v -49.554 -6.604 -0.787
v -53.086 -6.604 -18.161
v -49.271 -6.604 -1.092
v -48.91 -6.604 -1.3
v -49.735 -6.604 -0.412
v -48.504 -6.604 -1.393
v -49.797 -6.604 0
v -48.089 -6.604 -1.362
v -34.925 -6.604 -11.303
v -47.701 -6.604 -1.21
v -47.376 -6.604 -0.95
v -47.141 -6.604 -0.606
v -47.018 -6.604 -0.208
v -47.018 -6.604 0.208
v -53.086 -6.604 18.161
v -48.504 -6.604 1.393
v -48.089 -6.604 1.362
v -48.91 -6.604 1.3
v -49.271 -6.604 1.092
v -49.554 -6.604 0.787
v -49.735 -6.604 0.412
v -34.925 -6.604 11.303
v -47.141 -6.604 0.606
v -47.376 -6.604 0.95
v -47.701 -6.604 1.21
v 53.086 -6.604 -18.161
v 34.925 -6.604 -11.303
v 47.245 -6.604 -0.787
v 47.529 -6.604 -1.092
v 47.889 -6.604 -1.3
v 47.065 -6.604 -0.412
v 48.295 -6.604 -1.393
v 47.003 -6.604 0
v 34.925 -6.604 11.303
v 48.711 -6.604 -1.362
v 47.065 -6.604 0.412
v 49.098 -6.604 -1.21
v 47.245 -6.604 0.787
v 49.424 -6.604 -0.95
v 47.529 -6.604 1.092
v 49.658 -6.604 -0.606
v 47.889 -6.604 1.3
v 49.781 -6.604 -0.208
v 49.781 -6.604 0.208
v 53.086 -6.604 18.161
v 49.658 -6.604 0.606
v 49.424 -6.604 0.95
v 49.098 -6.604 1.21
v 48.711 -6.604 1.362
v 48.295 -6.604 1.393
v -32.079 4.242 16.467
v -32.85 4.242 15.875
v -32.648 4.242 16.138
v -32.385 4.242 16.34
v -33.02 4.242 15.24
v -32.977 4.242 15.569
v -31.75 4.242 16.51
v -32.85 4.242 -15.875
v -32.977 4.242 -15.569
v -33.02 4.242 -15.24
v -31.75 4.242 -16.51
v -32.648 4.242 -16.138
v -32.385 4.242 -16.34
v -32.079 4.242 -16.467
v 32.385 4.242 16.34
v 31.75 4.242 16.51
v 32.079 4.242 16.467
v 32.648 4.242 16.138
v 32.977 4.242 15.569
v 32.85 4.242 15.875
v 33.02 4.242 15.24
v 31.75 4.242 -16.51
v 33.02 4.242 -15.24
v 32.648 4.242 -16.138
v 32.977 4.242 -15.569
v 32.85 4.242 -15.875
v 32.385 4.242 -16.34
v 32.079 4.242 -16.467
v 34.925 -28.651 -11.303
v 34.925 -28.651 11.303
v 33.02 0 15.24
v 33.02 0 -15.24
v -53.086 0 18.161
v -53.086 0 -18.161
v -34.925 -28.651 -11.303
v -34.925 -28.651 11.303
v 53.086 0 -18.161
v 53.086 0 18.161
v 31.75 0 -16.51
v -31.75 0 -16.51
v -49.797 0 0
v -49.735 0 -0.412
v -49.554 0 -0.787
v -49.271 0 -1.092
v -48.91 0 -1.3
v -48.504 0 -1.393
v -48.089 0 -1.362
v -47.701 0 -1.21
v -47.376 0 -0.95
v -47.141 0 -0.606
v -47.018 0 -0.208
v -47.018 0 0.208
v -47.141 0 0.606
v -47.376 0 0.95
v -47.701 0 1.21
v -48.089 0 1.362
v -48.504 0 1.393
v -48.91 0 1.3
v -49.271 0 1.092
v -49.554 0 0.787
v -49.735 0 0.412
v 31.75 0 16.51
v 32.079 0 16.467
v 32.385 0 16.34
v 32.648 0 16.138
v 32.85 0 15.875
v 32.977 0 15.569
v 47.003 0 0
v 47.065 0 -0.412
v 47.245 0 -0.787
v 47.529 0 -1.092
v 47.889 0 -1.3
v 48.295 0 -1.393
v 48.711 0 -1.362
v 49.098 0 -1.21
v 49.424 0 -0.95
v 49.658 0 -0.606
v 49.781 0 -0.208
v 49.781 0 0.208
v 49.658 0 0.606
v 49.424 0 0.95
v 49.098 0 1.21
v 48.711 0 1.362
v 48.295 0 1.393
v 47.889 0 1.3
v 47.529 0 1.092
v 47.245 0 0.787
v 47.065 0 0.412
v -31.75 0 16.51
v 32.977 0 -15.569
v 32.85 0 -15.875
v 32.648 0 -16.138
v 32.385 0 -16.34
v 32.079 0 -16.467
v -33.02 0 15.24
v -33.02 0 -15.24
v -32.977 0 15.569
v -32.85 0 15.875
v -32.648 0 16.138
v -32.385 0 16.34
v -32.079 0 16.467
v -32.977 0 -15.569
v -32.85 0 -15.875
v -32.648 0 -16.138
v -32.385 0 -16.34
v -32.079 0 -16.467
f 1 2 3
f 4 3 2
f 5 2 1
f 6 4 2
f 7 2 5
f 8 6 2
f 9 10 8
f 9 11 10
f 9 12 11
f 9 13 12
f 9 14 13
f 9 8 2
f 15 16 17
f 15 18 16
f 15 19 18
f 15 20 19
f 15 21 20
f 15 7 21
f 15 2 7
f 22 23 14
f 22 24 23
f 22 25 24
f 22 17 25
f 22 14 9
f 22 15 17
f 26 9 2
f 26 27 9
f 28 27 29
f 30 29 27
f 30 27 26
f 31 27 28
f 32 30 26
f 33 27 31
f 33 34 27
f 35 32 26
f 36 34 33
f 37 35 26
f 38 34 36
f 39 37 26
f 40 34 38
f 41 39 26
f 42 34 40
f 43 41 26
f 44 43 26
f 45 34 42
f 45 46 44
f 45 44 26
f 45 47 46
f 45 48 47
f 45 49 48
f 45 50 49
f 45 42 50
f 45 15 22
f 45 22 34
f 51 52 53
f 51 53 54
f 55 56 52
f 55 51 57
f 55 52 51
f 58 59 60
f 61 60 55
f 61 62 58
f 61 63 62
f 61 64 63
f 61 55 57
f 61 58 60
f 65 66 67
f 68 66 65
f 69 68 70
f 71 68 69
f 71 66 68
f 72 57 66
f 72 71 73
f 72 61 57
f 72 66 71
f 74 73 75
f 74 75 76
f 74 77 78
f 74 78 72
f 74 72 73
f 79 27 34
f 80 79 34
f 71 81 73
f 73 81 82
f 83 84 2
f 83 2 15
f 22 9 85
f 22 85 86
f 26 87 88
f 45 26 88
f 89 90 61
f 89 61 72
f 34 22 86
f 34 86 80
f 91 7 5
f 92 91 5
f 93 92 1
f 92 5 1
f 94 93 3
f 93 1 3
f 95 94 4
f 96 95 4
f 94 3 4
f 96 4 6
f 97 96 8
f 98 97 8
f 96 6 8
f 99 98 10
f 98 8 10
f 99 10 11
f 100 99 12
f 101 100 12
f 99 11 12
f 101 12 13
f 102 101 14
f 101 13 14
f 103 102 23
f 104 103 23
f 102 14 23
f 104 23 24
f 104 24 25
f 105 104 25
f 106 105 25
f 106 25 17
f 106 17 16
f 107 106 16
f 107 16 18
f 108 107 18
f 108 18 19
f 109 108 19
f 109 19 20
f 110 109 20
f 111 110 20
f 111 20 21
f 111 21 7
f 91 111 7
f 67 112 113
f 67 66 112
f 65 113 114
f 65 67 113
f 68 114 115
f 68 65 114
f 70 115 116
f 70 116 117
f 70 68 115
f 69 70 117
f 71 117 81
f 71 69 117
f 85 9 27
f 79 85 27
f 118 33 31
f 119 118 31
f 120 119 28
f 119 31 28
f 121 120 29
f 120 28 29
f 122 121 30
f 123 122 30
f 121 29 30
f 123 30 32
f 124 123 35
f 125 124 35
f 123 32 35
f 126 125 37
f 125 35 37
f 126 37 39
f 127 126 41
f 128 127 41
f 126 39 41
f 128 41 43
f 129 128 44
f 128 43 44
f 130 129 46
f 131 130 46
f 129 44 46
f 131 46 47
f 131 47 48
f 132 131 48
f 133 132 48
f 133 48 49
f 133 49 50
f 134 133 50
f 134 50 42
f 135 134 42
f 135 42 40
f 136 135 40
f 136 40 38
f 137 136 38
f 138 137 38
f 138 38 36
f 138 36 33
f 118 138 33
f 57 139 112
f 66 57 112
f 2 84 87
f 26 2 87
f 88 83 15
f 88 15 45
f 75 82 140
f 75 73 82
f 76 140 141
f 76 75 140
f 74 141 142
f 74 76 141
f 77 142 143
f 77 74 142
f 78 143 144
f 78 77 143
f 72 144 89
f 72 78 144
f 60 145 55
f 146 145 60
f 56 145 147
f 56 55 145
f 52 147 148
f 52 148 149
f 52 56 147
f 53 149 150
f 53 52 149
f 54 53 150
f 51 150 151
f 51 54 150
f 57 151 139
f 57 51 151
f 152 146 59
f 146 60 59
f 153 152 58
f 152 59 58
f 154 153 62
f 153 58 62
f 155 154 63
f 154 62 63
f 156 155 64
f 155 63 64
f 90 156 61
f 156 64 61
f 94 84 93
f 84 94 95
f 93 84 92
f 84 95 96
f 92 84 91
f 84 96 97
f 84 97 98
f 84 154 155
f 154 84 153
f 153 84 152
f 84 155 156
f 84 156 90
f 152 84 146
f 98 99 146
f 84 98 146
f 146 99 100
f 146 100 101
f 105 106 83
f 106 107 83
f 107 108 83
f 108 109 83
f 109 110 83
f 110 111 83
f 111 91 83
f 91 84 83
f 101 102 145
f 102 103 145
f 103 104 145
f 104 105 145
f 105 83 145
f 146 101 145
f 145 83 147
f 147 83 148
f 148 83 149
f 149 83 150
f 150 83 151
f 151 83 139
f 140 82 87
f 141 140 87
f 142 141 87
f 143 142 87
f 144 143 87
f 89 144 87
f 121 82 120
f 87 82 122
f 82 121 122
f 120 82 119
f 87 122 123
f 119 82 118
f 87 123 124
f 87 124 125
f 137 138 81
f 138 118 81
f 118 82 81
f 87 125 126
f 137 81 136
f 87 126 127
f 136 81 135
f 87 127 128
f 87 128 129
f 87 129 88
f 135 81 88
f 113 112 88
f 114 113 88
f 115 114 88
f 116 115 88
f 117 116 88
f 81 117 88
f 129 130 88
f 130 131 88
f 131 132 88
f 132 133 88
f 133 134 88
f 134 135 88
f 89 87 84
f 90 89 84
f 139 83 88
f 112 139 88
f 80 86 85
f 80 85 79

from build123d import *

# Parameters (mm, degrees)
SKETCH1_W             = 66.04
SKETCH1_H             = 33.02
BOSS_EXTRUDE1_DEPTH   = 4.2418
FILLET1_R             = 1.27
SKETCH2_W             = 106.172
SKETCH2_H             = 36.322
BOSS_EXTRUDE2_DEPTH   = 6.604
F_3_CLEARANCE_HOLE1_D = 2.794
SKETCH6_W             = 69.85
SKETCH6_H             = 22.606
BOSS_EXTRUDE3_DEPTH   = 22.0472


with BuildPart() as part:
    # Sketch1 → Boss-Extrude1 (new body)
    with BuildSketch(Plane(origin=(0, 0, 0), x_dir=(1, 0, 0), z_dir=(0, 1, 0))):
        Rectangle(SKETCH1_W, SKETCH1_H)
    extrude(amount=BOSS_EXTRUDE1_DEPTH)

    # Fillet1
    fillet1_edges = [part.edges().sort_by_distance(p)[0] for p in [
        (33.02, 2.1209, 16.51),
        (-33.02, 2.1209, 16.51),
        (-33.02, 2.1209, -16.51),
        (33.02, 2.1209, -16.51),
    ]]
    fillet(fillet1_edges, radius=FILLET1_R)

    # Sketch2 → Boss-Extrude2 (add)
    with BuildSketch(Plane.XZ):
        Rectangle(SKETCH2_W, SKETCH2_H)
    extrude(amount=BOSS_EXTRUDE2_DEPTH)

    # #3 Clearance Hole1 (through all)
    with Locations(Plane(origin=(0, 0, 0), x_dir=(1, 0, 0), z_dir=(0, 1, 0))):
        with Locations((-48.3997, 0), (48.3997, 0)):
            Hole(F_3_CLEARANCE_HOLE1_D / 2)

    # Sketch6 → Boss-Extrude3 (add)
    with BuildSketch(Plane.XZ.offset(6.604)):
        Rectangle(SKETCH6_W, SKETCH6_H)
    extrude(amount=BOSS_EXTRUDE3_DEPTH)


solid = part.part
